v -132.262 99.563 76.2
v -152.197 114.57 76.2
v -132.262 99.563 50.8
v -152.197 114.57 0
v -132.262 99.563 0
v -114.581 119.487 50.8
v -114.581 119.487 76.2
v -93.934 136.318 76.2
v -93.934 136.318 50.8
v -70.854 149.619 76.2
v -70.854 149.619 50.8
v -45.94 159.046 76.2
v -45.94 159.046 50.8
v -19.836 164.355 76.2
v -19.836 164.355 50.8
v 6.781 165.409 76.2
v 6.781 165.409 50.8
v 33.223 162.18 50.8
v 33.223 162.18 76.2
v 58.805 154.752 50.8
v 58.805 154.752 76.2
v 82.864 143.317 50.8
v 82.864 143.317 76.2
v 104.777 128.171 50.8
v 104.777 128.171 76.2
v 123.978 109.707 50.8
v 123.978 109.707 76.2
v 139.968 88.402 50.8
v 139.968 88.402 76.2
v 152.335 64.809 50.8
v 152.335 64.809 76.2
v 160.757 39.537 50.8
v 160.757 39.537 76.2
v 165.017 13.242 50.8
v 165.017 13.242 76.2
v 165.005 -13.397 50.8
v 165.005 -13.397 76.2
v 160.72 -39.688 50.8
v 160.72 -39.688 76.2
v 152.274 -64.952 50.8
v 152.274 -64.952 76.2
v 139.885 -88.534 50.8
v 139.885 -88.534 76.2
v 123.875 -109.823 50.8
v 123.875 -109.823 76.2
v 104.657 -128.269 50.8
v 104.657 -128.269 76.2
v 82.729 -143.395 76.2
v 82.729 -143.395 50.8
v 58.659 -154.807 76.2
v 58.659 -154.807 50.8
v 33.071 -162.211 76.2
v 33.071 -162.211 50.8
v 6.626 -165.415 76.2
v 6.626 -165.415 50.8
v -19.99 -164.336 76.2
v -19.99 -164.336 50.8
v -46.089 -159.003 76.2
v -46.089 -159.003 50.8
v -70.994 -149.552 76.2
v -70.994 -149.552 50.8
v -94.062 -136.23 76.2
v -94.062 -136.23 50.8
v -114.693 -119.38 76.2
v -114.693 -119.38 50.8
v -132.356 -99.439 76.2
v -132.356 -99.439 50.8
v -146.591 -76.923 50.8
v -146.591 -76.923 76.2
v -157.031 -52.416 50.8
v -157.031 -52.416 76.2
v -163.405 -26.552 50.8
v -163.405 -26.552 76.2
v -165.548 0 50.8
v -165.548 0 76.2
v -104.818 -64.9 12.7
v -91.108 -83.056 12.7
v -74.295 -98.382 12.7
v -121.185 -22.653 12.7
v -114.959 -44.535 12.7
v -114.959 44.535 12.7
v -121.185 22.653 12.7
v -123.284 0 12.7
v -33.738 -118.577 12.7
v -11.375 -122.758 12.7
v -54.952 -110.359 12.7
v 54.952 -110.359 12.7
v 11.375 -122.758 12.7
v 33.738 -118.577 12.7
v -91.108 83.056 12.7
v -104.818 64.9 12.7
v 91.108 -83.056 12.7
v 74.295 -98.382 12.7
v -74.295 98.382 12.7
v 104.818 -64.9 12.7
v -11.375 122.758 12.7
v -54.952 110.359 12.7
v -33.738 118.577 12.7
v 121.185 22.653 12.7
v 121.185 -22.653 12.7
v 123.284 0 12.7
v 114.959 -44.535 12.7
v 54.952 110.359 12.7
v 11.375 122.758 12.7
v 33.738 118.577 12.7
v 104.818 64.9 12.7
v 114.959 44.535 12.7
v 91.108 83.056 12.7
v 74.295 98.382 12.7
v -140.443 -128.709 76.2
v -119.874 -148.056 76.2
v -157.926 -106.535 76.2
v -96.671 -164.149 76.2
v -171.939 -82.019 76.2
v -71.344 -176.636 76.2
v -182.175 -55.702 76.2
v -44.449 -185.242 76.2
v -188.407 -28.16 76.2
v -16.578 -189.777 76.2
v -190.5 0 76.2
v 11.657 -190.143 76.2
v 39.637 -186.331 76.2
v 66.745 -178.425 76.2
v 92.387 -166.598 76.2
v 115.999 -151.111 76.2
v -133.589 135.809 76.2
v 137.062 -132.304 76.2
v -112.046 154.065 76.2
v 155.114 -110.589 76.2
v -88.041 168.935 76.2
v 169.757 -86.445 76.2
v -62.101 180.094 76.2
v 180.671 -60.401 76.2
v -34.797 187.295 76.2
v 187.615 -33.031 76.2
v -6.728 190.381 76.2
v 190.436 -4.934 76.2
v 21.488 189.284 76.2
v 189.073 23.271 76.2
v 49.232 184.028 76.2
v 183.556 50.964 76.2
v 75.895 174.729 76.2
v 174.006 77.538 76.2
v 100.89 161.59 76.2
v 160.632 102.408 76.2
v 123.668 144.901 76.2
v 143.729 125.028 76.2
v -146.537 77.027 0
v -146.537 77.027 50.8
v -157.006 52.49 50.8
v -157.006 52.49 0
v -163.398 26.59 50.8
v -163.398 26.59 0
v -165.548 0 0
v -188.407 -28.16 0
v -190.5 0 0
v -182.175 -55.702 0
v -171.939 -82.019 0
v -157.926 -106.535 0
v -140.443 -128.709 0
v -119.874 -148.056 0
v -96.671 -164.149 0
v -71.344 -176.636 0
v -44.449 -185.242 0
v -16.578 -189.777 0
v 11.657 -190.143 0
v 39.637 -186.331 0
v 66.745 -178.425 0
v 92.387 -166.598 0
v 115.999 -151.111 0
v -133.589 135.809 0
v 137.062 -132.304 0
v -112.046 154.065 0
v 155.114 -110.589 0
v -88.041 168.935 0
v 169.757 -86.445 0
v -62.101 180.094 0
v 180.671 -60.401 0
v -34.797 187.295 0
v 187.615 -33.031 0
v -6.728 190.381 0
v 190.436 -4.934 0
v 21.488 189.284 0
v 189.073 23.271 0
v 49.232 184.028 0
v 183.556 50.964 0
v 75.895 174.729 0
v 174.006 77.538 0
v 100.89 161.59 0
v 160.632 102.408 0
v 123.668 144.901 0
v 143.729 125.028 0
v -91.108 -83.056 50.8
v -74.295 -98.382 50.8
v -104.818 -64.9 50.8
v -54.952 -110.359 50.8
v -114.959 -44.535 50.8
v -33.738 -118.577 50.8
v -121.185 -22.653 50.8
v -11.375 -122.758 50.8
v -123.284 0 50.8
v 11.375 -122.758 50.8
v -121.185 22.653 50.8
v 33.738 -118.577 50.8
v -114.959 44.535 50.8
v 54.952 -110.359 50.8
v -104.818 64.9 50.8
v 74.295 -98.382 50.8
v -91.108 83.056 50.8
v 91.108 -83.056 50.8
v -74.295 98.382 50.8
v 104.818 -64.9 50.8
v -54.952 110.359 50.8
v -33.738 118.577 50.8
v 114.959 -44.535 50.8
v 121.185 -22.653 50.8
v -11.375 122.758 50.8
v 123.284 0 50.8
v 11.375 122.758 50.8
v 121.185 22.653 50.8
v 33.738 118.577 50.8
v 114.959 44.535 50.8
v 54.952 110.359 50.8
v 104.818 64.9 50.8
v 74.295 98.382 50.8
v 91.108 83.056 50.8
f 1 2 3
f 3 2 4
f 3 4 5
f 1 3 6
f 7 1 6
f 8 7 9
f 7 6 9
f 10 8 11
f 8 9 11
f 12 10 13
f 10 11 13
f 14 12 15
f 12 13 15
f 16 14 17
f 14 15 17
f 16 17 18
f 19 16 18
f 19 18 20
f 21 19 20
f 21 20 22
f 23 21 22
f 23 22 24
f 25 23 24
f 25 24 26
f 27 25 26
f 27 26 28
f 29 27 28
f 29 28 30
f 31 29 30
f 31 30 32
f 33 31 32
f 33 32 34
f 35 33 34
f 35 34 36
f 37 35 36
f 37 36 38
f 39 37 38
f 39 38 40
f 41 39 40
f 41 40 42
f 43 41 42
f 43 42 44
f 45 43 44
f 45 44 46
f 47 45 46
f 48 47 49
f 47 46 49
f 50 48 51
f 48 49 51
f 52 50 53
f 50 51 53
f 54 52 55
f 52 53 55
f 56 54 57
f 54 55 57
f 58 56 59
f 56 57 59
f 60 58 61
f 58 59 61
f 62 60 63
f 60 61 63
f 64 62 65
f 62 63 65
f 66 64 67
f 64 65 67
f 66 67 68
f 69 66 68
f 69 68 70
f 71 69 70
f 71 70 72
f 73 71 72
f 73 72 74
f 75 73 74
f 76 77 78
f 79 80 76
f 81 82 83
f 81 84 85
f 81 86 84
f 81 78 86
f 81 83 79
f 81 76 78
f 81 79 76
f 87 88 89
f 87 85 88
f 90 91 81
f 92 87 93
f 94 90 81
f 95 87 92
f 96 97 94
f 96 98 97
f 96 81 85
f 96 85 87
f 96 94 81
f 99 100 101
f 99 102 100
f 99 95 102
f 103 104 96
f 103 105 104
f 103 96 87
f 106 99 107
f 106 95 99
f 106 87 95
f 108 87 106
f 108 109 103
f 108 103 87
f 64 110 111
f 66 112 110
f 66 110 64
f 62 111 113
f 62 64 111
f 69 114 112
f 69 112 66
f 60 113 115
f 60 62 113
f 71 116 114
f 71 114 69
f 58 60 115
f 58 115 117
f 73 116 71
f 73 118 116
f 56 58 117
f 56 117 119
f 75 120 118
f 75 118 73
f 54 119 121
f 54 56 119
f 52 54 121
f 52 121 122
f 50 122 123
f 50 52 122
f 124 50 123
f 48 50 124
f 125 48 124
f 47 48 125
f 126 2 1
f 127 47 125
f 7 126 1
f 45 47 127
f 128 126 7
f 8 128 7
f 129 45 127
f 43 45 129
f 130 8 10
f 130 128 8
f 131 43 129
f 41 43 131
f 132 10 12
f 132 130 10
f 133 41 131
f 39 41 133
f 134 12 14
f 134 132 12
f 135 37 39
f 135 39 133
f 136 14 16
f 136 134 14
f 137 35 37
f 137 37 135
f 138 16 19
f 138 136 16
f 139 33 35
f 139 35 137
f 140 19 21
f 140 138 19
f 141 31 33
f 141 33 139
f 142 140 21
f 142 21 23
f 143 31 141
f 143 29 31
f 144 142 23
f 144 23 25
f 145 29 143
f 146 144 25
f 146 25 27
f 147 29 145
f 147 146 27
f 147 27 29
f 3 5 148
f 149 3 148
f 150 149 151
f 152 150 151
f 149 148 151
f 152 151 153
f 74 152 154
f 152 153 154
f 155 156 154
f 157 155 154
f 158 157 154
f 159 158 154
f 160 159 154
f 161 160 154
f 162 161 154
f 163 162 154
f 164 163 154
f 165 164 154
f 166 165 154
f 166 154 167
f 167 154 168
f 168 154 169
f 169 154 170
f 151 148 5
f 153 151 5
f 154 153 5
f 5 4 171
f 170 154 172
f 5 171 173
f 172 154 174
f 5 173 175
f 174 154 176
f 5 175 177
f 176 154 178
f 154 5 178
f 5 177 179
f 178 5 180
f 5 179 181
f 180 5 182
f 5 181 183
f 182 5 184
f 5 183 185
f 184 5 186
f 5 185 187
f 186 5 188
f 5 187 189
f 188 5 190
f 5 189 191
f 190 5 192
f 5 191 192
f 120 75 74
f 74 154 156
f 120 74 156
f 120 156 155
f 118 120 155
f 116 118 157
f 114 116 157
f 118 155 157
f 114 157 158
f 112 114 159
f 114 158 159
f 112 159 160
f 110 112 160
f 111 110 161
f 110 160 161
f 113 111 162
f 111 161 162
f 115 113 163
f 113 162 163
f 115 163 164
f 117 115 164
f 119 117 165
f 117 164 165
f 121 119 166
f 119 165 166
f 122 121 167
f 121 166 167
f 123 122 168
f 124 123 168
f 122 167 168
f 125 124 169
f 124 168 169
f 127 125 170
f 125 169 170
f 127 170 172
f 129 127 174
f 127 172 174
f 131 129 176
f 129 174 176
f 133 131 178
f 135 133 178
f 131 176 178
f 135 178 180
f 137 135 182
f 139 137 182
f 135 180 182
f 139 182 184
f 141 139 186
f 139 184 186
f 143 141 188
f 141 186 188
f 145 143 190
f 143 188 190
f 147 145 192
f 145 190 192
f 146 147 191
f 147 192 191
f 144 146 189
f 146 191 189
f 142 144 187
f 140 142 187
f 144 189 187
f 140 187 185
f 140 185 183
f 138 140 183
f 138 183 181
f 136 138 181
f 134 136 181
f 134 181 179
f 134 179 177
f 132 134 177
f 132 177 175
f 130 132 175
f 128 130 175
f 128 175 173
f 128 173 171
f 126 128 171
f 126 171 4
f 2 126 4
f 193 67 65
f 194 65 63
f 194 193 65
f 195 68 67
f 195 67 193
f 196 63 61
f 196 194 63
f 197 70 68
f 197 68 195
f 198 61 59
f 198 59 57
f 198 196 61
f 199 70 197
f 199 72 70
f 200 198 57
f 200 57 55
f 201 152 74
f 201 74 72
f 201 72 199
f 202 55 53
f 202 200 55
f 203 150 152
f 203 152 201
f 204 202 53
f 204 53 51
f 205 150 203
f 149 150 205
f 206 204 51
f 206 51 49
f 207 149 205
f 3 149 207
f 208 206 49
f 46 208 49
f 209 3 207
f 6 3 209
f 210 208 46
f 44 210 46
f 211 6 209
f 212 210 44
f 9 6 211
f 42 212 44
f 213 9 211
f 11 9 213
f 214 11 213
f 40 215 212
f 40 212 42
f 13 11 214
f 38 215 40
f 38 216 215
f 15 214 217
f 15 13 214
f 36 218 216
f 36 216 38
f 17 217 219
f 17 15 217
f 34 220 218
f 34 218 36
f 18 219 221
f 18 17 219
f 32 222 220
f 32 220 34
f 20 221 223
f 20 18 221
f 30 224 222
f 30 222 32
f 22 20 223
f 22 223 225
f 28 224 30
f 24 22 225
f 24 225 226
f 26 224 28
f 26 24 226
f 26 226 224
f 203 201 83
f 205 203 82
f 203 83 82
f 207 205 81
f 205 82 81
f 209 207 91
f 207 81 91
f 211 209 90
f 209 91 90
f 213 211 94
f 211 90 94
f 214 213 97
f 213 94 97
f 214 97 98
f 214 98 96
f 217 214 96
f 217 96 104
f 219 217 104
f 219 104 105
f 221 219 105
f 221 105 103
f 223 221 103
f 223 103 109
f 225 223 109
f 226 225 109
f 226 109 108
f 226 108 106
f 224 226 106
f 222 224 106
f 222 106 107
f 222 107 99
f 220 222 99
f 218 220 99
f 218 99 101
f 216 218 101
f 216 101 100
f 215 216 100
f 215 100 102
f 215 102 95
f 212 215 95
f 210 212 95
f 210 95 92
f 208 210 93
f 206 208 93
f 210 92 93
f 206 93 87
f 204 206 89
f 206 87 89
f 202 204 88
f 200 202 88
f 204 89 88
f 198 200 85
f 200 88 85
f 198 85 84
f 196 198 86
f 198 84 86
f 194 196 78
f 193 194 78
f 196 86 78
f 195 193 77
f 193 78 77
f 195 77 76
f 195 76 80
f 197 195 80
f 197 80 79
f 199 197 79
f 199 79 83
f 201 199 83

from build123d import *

# Parameters (mm, degrees)
F1_DEPTH = 76.2
F2_DEPTH = 50.8
F3_DEPTH = 12.7
F4_DEPTH = 50.8
F5_DEPTH = 12.7


with BuildPart() as f1:
    # F0 (on Top) → F1 (new body)
    with BuildSketch(Plane.XY):
        with BuildLine():
            ThreePointArc((-190.5, 0), (0, -190.5), (190.5, 0))
            ThreePointArc((190.5, 0), (60.4014109978, 180.6707490146), (-152.1973181048, 114.5697445302))
            Line((-152.1973181048, 114.5697445302), (-132.2621264517, 99.5631081236))
            ThreePointArc((-132.2621264517, 99.5631081236), (52.4898806282, 157.0060349935), (165.5478256962, 0))
            ThreePointArc((165.5478256962, 0), (0, -165.5478256962), (-165.5478256962, 0))
            Line((-165.5478256962, 0), (-190.5, 0))
        make_face()
    extrude(amount=F1_DEPTH)

    # F0 (on Top) → F2 (join)
    with BuildSketch(Plane.XY):
        with BuildLine():
            ThreePointArc((165.5478256962, 0), (52.4898806282, 157.0060349935), (-132.2621264517, 99.5631081236))
            Line((-132.2621264517, 99.5631081236), (-98.495770837, 74.1447710289))
            ThreePointArc((-98.495770837, 74.1447710289), (39.0892796926, 116.9225904469), (123.2836726566, 0))
            ThreePointArc((123.2836726566, 0), (0, -123.2836726566), (-123.2836726566, 0))
            Line((-123.2836726566, 0), (-165.5478256962, 0))
            ThreePointArc((-165.5478256962, 0), (0, -165.5478256962), (165.5478256962, 0))
        make_face()
    extrude(amount=F2_DEPTH)

    # F0 (on Top) → F3 (join)
    with BuildSketch(Plane.XY):
        with BuildLine():
            ThreePointArc((123.2836726566, 0), (39.0892796926, 116.9225904469), (-98.495770837, 74.1447710289))
            Line((-98.495770837, 74.1447710289), (0, 0))
            Line((0, 0), (-123.2836726566, 0))
            ThreePointArc((-123.2836726566, 0), (0, -123.2836726566), (123.2836726566, 0))
        make_face()
    extrude(amount=F3_DEPTH)

    # F0 (on Top) → F4 (join)
    with BuildSketch(Plane.XY):
        with BuildLine():
            Line((-98.495770837, 74.1447710289), (-132.2621264517, 99.5631081236))
            ThreePointArc((-132.2621264517, 99.5631081236), (-157.0060349935, 52.4898806282), (-165.5478256962, 0))
            Line((-165.5478256962, 0), (-123.2836726566, 0))
            ThreePointArc((-123.2836726566, 0), (-116.9225904469, 39.0892796926), (-98.495770837, 74.1447710289))
        make_face()
    extrude(amount=F4_DEPTH)

    # F0 (on Top) → F5 (join)
    with BuildSketch(Plane.XY):
        with BuildLine():
            Line((0, 0), (-98.495770837, 74.1447710289))
            ThreePointArc((-98.495770837, 74.1447710289), (-116.9225904469, 39.0892796926), (-123.2836726566, 0))
            Line((-123.2836726566, 0), (0, 0))
        make_face()
    extrude(amount=F5_DEPTH)


solid = f1.part
